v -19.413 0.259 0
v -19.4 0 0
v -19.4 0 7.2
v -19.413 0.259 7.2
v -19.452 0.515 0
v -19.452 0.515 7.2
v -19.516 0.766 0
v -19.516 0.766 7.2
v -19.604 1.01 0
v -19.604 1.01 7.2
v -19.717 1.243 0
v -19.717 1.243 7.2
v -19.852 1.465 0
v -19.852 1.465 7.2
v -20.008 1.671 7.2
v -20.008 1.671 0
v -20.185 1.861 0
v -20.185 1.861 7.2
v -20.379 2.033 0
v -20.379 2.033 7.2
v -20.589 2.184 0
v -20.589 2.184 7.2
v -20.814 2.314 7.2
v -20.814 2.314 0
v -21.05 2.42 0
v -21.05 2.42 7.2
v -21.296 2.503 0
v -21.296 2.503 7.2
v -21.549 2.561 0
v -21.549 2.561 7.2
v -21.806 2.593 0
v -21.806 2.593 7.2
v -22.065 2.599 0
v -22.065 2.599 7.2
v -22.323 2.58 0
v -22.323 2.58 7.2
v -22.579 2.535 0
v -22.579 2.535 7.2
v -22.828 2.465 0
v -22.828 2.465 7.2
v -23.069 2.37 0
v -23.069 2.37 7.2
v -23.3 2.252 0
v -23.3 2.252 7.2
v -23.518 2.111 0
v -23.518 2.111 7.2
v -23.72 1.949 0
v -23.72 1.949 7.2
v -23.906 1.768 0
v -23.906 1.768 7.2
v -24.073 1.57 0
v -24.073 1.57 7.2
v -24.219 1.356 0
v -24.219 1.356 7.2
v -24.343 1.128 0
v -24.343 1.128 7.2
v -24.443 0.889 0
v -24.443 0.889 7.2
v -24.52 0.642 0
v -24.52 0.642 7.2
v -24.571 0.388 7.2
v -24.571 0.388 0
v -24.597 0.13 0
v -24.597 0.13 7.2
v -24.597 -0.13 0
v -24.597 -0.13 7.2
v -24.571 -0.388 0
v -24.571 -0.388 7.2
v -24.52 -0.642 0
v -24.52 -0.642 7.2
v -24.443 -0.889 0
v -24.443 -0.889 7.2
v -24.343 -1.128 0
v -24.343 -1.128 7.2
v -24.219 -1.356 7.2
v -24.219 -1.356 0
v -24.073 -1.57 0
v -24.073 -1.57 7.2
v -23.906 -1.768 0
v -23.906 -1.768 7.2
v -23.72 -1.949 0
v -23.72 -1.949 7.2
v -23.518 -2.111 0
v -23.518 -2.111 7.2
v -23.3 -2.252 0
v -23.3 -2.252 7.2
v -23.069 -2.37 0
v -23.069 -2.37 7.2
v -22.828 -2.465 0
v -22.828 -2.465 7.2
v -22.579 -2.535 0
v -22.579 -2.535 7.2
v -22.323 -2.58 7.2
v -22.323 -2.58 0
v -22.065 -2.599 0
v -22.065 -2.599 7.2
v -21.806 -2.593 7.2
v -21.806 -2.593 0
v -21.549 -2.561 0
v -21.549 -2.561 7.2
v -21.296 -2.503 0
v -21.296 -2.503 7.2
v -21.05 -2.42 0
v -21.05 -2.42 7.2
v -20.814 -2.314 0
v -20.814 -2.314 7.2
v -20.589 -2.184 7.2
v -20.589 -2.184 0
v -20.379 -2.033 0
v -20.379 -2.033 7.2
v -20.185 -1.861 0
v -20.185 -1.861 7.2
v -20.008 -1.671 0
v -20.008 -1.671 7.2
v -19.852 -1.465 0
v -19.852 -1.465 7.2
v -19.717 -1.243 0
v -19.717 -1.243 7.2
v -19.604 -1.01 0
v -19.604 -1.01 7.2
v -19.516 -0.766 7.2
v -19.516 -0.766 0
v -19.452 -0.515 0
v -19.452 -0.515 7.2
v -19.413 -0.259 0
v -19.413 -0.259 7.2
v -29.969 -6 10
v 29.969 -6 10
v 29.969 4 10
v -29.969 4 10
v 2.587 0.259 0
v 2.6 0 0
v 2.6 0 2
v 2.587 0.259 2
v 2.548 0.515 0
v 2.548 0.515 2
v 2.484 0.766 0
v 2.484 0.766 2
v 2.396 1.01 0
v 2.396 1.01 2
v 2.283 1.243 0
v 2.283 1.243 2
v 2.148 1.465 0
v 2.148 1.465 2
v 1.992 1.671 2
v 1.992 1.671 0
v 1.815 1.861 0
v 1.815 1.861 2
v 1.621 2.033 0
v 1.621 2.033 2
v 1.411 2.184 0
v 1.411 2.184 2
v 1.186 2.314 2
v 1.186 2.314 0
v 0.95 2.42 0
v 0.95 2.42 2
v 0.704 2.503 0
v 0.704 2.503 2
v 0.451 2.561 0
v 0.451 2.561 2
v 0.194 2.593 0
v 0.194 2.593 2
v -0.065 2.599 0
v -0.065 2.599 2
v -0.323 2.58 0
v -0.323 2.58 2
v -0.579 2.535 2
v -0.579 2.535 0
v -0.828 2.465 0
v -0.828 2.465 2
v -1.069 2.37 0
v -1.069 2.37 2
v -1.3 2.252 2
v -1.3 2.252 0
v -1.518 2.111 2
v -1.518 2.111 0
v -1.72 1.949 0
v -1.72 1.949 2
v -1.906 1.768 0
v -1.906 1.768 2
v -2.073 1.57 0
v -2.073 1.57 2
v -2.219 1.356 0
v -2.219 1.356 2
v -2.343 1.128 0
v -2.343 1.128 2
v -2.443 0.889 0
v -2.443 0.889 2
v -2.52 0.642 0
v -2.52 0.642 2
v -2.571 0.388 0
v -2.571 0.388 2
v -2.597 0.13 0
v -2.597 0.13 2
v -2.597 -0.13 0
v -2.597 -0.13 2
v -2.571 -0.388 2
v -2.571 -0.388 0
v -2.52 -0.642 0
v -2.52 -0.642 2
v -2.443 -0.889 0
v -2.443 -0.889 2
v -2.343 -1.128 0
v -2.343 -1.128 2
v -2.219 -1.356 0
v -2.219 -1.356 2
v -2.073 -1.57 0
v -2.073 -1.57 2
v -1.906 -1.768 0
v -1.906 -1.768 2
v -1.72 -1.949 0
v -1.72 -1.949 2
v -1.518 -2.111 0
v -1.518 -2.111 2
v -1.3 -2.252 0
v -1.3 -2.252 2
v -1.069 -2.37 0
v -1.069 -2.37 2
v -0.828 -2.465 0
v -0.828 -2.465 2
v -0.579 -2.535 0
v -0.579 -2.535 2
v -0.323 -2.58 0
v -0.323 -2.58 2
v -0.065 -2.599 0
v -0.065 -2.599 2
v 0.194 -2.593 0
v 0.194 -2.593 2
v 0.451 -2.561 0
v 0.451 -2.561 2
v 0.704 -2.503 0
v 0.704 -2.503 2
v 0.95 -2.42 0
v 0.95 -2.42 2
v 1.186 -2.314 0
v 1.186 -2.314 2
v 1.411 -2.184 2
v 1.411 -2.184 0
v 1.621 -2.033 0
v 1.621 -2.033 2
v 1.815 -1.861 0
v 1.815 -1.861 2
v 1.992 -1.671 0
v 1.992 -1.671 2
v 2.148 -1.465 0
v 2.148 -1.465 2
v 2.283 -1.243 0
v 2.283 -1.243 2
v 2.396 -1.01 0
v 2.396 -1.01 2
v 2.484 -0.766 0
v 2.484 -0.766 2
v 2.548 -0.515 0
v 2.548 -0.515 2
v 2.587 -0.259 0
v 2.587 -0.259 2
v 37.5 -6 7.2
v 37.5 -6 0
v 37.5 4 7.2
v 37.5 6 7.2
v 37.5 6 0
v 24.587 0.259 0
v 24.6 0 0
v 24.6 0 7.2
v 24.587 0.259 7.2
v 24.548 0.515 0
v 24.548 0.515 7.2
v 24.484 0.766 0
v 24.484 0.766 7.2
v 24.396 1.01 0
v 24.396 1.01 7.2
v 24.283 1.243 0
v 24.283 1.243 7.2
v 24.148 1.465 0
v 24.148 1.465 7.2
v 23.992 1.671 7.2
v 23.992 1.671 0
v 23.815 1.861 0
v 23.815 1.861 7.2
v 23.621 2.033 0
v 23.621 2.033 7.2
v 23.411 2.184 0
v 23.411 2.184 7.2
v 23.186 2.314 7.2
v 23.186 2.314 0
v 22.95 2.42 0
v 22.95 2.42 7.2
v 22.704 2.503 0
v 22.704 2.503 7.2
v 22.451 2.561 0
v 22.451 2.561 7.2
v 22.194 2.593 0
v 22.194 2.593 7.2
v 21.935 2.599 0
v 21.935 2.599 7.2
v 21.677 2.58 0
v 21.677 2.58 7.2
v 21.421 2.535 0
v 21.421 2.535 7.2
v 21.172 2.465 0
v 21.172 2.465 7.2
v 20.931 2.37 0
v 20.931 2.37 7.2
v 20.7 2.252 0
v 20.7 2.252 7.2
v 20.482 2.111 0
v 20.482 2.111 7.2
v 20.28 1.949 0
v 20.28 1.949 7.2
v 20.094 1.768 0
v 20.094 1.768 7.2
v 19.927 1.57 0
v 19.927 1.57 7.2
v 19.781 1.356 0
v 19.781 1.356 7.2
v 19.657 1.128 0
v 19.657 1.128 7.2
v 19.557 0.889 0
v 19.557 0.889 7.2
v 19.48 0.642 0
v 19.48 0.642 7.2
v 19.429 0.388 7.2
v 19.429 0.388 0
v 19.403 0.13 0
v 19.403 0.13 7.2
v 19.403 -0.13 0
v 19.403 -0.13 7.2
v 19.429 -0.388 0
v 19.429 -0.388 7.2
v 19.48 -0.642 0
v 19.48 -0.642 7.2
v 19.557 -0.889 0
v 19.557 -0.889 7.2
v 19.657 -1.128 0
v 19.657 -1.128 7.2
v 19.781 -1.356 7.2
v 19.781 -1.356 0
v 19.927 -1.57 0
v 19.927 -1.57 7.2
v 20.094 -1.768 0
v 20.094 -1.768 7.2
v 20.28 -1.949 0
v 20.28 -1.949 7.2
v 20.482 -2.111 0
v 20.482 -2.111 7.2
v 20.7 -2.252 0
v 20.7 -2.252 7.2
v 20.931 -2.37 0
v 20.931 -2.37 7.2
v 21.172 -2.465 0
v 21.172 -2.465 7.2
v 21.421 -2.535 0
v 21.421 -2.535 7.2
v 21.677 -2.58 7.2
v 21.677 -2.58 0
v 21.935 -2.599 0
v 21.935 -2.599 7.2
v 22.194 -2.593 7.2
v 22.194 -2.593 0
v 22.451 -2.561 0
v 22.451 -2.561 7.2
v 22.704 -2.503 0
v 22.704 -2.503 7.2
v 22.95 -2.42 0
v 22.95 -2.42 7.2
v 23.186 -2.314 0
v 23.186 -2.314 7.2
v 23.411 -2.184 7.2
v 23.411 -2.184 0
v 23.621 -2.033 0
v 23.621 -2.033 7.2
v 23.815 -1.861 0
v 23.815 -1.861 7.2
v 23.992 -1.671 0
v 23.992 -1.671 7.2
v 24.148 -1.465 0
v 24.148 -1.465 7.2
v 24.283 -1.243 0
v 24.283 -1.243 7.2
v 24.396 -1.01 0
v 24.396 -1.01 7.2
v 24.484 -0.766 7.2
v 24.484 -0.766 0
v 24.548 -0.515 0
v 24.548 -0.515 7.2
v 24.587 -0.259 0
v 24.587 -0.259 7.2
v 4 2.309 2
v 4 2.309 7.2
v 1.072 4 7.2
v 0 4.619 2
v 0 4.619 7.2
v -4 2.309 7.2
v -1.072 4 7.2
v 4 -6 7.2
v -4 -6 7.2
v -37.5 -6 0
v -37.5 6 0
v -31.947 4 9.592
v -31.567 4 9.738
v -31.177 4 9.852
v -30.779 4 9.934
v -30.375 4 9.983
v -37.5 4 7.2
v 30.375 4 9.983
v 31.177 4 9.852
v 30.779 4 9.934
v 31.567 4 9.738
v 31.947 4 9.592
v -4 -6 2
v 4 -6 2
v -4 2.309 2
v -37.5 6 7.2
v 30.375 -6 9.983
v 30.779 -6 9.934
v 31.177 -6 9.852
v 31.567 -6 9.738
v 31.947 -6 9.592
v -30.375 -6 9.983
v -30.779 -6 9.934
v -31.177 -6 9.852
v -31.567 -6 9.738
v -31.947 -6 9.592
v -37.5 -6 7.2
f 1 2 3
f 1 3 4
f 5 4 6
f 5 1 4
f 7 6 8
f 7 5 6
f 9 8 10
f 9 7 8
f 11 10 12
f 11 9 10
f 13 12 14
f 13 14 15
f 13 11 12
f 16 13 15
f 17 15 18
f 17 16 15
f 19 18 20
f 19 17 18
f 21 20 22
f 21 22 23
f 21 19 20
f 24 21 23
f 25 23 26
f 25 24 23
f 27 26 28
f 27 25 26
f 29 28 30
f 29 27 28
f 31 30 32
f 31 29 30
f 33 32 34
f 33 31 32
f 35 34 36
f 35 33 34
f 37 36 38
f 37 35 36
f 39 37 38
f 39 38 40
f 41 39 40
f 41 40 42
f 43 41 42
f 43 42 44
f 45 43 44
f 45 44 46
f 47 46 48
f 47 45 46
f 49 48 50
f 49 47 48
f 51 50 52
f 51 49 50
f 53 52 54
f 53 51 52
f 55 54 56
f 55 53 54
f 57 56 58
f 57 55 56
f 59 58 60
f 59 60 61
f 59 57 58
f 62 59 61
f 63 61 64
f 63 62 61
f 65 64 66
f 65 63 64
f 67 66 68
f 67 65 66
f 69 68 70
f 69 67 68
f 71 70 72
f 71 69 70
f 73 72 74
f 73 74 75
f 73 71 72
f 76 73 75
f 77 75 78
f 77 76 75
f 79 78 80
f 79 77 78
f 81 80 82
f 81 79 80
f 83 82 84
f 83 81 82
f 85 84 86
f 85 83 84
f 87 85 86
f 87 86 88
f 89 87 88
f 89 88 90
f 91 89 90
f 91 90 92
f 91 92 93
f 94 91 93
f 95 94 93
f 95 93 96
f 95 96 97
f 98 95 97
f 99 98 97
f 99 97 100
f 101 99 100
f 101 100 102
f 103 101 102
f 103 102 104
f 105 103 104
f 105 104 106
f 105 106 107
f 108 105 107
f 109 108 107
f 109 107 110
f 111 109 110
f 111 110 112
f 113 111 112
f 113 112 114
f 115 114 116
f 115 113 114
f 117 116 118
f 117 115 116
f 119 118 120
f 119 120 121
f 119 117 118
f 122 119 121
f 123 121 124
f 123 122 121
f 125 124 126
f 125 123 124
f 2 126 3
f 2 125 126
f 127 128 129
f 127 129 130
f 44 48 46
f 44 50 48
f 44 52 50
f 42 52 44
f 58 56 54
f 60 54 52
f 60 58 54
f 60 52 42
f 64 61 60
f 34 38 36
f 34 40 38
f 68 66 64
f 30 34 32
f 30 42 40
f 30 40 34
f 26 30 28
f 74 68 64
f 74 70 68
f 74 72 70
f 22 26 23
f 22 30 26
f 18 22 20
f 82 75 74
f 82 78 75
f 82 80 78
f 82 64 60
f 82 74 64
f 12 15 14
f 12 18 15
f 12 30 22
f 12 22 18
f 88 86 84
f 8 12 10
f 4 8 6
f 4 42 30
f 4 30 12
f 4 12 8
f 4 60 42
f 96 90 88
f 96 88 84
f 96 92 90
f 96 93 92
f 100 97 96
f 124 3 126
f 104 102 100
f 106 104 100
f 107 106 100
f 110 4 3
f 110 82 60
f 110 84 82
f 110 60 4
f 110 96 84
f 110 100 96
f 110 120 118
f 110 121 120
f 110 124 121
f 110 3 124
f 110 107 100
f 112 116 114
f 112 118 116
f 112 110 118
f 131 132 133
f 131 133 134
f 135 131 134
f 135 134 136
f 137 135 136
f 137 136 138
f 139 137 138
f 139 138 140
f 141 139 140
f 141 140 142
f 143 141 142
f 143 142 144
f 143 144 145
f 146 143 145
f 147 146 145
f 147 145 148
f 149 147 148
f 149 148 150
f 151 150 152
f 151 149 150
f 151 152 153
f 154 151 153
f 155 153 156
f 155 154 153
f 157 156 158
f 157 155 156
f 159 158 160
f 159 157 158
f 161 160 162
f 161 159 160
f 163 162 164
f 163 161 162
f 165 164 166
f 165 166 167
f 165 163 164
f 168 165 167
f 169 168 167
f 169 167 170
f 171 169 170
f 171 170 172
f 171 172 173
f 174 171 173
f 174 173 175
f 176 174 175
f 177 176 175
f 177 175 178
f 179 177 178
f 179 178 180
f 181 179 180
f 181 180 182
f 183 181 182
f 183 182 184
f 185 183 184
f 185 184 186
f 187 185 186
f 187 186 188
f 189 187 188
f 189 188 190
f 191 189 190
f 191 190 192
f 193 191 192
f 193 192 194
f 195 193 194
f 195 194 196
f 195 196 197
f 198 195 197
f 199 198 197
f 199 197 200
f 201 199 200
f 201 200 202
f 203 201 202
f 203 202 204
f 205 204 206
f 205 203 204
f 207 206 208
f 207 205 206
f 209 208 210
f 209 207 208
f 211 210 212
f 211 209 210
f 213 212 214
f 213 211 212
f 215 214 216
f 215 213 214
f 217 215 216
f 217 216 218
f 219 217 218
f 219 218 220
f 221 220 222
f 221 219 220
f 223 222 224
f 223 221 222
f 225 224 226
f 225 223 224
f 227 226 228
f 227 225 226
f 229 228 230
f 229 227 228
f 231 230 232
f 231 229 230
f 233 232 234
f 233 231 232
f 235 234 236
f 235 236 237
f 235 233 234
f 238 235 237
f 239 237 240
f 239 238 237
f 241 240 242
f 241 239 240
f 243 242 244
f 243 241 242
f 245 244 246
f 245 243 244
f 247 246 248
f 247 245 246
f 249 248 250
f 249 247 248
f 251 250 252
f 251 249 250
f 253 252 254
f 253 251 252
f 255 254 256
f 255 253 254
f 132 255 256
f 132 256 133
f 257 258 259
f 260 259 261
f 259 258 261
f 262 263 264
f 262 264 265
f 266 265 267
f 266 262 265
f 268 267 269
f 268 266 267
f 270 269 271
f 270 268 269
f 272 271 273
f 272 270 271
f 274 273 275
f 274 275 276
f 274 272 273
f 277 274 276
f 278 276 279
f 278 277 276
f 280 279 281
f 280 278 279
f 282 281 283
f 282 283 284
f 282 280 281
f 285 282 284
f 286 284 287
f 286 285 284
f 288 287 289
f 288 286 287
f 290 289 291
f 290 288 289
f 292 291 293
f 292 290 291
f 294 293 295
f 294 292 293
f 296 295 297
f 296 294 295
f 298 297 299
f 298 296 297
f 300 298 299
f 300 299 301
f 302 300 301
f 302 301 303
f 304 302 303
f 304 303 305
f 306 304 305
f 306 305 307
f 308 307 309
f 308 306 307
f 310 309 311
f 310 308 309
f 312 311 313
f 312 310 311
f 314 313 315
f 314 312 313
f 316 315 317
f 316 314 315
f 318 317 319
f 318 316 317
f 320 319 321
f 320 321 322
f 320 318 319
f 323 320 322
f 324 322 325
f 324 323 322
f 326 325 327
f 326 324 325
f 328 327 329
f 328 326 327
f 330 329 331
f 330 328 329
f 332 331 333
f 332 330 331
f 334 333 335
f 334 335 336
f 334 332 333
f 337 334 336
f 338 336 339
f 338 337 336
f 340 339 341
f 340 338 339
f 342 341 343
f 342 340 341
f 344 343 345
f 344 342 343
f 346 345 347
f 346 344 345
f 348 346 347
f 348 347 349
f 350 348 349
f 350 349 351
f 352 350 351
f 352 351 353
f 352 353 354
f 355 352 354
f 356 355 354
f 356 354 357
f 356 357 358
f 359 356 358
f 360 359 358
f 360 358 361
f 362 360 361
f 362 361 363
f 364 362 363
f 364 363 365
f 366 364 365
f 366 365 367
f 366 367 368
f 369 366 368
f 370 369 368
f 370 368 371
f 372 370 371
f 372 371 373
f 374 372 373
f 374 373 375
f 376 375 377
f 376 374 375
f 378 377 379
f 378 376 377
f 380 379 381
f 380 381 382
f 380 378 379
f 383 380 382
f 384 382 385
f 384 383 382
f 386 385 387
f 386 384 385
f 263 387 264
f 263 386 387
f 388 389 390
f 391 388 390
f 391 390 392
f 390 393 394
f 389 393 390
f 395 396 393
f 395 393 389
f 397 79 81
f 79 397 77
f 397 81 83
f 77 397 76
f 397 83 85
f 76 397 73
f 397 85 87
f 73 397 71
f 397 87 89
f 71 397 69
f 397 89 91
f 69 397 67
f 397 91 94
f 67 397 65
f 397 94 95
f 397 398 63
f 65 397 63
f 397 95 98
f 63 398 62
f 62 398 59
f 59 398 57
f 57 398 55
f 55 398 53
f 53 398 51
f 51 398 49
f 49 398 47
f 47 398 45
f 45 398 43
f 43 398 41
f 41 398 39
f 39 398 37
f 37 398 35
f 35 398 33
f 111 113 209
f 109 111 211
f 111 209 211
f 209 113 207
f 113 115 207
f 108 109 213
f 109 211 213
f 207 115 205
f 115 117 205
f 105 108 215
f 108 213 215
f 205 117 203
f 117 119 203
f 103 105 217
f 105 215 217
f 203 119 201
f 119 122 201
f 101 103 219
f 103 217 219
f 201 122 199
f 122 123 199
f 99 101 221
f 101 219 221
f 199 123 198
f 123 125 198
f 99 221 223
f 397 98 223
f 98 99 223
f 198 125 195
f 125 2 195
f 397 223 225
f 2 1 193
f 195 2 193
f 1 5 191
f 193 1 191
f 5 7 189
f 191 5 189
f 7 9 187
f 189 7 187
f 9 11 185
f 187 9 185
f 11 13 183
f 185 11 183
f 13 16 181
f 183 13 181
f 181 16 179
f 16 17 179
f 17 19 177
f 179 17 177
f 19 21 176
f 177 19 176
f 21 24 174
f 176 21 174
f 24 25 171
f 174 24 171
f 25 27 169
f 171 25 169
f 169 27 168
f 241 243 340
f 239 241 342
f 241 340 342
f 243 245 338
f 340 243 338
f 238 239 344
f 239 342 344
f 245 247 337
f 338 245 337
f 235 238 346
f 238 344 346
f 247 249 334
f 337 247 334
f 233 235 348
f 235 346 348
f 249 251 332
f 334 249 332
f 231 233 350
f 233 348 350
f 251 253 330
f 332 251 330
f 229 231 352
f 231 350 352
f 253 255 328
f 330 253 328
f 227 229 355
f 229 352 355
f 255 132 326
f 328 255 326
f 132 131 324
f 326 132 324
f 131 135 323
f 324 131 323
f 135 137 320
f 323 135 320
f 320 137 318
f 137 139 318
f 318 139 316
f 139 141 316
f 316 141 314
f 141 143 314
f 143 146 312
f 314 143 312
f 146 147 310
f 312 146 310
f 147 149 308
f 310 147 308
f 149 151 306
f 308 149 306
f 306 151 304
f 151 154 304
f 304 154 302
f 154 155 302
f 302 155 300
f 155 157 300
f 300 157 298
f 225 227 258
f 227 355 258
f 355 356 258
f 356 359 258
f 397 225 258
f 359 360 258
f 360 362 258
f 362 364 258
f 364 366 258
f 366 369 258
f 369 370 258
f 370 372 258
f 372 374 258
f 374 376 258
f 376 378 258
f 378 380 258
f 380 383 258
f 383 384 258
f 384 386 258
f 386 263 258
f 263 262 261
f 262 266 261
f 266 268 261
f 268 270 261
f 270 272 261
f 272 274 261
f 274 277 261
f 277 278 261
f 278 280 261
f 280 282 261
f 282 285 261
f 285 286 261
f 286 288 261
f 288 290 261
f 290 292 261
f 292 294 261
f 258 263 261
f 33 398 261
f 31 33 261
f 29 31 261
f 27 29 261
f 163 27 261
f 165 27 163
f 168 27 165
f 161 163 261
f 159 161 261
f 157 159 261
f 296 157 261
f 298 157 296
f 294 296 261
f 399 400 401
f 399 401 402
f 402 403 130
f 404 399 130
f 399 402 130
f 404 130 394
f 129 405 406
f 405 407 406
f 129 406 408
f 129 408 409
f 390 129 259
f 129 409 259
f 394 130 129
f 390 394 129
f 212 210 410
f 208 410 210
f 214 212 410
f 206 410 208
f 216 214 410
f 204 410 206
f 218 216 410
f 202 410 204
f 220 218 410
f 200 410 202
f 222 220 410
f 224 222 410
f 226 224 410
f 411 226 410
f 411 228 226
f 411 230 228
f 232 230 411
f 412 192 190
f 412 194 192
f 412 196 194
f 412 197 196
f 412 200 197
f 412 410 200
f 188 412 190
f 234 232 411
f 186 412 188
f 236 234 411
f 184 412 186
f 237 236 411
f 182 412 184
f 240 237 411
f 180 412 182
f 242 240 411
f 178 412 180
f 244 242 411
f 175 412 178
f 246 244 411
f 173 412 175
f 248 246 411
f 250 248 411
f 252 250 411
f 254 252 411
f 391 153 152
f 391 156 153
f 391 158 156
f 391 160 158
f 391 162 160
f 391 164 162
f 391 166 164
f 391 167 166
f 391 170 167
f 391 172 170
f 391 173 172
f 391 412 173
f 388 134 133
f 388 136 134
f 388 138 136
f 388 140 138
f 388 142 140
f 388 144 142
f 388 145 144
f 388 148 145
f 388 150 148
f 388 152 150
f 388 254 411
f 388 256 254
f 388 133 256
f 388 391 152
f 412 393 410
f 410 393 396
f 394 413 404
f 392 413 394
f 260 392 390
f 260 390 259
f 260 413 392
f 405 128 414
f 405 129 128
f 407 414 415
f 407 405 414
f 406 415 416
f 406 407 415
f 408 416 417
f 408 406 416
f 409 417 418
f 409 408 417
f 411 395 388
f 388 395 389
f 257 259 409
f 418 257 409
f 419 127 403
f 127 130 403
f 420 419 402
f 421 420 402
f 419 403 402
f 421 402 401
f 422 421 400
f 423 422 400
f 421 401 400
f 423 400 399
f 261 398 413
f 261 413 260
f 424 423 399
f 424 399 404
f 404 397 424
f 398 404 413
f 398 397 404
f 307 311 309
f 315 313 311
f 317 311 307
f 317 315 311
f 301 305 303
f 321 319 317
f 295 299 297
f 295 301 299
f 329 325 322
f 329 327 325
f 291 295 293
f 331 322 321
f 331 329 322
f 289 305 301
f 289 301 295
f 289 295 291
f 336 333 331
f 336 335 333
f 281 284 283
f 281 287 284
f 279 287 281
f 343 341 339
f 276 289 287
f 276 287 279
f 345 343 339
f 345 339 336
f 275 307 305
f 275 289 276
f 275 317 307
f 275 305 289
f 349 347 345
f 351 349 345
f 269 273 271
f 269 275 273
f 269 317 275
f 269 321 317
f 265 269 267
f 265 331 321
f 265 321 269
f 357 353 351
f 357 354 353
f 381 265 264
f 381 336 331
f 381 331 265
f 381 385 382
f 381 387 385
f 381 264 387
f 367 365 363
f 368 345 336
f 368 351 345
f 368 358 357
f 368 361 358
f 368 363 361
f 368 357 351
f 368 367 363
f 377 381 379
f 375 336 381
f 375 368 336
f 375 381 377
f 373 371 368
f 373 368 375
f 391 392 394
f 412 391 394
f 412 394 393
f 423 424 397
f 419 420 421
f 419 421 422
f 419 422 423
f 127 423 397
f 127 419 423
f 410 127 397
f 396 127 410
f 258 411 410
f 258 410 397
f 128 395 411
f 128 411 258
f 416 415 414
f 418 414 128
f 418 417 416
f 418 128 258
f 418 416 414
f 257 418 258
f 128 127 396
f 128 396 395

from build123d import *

# Parameters (mm, degrees)
F0_W     = 75
F0_H     = 12
F0_R     = 2.6
F1_DEPTH = 7.2
F2_R     = 2.6
F3_DEPTH = 5.2
F5_DEPTH = 10
F6_R     = 5


with BuildPart() as f1:
    # F0 (on Top) → F1 (new body)
    with BuildSketch(Plane.XY):
        Rectangle(F0_W, F0_H)
        with Locations((-22, 0)):
            Circle(F0_R, mode=Mode.SUBTRACT)
        Circle(F0_R, mode=Mode.SUBTRACT)
        with Locations((22, 0)):
            Circle(F0_R, mode=Mode.SUBTRACT)
    extrude(amount=F1_DEPTH)

    # F2 (on face) → F3 (cut)
    with BuildSketch(Plane.XY.offset(7.2)):
        Polygon((4, -2.309401), (4, 2.309401), (0, 4.618802), (-4, 2.309401), (-4, -2.309401), (-4, -6), (4, -6), align=None)
        Circle(F2_R, mode=Mode.SUBTRACT)
    extrude(amount=-F3_DEPTH, mode=Mode.SUBTRACT)

    # F4 (on face) → F5 (join)
    with BuildSketch(Plane.XZ.offset(6)):
        Polygon((31, 10), (-31, 10), (-37.5, 7.2), (37.5, 7.2), align=None)
    extrude(amount=-F5_DEPTH)

    # F6
    f6_edges = [f1.edges().sort_by_distance(p)[0] for p in [
        (-31, -1, 10),
        (31, -1, 10),
    ]]
    fillet(f6_edges, radius=F6_R)


solid = f1.part
